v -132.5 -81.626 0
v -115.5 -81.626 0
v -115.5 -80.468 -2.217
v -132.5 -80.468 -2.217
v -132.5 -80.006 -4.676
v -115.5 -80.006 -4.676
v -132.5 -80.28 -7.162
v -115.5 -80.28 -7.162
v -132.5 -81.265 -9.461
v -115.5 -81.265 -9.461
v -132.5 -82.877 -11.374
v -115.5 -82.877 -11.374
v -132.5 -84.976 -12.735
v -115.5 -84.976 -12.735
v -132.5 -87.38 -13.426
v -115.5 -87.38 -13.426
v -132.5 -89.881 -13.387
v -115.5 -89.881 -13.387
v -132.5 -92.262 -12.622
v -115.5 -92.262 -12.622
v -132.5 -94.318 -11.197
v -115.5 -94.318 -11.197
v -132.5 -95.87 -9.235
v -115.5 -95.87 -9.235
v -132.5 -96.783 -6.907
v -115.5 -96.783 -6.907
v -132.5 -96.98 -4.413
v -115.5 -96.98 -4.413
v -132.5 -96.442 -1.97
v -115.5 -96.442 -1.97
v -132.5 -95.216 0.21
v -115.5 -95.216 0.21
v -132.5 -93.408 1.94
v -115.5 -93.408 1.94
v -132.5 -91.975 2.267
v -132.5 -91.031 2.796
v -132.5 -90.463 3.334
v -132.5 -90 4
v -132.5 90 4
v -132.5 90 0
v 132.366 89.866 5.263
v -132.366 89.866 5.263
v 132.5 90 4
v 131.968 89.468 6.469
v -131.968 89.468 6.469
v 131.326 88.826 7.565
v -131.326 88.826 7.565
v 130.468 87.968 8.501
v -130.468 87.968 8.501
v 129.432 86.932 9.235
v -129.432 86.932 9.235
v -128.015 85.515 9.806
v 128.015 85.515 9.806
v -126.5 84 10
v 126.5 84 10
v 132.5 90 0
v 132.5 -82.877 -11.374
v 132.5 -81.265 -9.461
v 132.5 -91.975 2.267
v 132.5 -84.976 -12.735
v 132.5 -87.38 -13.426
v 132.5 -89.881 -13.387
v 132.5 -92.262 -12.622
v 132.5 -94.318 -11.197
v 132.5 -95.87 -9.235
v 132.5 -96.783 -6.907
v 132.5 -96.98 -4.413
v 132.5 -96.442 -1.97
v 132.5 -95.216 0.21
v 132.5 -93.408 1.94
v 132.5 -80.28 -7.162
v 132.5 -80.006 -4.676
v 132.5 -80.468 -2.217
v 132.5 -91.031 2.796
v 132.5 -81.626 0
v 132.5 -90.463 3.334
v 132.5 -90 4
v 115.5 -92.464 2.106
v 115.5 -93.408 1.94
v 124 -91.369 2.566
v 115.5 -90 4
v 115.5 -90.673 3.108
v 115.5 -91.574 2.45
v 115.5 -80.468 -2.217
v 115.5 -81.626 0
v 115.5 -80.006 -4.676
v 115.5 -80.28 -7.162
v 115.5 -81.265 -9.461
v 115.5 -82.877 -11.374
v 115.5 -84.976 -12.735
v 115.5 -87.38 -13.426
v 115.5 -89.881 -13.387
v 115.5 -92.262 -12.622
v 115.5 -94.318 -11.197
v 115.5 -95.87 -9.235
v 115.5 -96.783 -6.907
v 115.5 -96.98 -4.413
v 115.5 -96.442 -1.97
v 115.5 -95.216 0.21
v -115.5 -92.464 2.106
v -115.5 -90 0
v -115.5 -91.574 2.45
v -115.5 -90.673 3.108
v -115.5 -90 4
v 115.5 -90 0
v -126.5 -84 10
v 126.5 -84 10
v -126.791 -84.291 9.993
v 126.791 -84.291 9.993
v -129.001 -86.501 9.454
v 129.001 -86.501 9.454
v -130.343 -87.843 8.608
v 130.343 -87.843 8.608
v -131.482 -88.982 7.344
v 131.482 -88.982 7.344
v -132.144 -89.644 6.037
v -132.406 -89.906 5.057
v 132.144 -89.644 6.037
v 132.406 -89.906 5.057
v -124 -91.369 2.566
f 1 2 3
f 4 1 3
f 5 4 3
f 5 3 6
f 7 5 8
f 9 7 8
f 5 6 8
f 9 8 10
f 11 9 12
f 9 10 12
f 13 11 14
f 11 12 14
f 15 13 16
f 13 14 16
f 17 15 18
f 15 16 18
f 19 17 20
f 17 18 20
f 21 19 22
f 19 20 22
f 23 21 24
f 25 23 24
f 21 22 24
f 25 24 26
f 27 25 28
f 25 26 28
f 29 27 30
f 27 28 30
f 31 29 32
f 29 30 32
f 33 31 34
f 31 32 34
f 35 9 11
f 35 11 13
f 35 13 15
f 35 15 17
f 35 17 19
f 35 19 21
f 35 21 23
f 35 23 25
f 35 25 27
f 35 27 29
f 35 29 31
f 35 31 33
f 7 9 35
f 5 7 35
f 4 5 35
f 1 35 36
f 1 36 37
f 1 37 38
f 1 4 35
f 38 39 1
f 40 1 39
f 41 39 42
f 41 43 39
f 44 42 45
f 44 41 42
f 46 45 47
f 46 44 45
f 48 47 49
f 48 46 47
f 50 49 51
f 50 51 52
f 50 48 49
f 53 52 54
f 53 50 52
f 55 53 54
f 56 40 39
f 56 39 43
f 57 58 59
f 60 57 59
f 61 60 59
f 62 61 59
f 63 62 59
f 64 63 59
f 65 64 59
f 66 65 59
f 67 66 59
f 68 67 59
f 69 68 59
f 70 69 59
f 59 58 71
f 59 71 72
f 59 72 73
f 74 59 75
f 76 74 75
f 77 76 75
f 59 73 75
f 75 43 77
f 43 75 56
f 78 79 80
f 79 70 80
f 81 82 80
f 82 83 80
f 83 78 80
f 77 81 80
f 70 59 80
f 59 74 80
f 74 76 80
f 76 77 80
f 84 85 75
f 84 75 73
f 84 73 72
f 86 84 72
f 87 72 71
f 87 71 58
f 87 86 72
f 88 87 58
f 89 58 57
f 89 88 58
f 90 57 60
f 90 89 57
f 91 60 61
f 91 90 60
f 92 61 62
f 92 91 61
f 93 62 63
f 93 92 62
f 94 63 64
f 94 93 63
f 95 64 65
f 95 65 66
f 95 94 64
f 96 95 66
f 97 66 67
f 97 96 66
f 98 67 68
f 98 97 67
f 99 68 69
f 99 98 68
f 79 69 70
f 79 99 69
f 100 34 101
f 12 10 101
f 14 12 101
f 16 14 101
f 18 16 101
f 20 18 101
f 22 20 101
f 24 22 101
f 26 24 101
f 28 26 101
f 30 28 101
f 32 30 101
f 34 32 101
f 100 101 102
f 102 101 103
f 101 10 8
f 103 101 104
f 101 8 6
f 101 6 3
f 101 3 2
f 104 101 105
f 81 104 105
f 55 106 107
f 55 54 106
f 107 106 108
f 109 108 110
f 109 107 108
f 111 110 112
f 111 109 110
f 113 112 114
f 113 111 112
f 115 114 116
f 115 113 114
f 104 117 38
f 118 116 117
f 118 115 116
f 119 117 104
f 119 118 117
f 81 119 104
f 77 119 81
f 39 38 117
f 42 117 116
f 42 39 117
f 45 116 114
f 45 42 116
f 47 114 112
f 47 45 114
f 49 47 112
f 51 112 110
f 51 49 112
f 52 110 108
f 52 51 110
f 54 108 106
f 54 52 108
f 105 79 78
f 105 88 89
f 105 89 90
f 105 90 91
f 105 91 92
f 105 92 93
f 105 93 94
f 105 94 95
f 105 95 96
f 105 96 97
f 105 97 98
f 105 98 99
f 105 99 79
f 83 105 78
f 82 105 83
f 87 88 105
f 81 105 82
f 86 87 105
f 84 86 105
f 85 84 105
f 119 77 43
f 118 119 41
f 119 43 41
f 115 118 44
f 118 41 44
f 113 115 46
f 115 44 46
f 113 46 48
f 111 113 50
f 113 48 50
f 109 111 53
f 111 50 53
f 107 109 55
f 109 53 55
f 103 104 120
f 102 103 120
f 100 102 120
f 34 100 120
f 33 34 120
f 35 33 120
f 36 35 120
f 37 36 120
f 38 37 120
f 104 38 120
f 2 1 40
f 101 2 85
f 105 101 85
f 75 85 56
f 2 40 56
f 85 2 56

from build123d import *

# Parameters (mm, degrees)
SKETCH1_W           = 265
SKETCH1_H           = 180
BOSS_EXTRUDE1_DEPTH = 10
BOSS_EXTRUDE2_START = -17
BOSS_EXTRUDE2_DEPTH = 17
FILLET1_R           = 6
FILLET2_R           = 6
CUT_EXTRUDE2_START  = -265
CUT_EXTRUDE2_DEPTH  = 265


# Read off the part's stored shape, not the designer's step: Boss-Extrude2, Cut-Extrude2
with BuildPart() as part:
    # Sketch1 → Boss-Extrude1 (new body)
    with BuildSketch(Plane.XY):
        Rectangle(SKETCH1_W, SKETCH1_H)
    extrude(amount=BOSS_EXTRUDE1_DEPTH)

    # Boss-Extrude2 outline → Boss-Extrude2 (add)
    with BuildSketch(Plane.ZY.offset(132.5).offset(BOSS_EXTRUDE2_START)):
        with BuildLine():
            ThreePointArc((0, -81.626136458), (-13.387109794, -89.880720577), (1.939630355, -93.408312392))
            add(Edge.make_bspline(
                [(1.939630355, -93.408312392), (5.863215247, -91.451215581), (10, -90)],
                knots=[0, 0, 0, 1, 1, 1], degree=2))
            Line((10, -90), (0, -90))
            Line((0, -90), (0, -81.626136458))
        make_face()
    boss_extrude2 = extrude(amount=BOSS_EXTRUDE2_DEPTH)

    # Mirror1: Boss-Extrude2 across plane
    add(boss_extrude2.mirror(Plane(origin=(0, 0, 0), x_dir=(0, 0, 1), z_dir=(1, 0, 0))))

    # Fillet1
    fillet1_edges = [part.edges().sort_by_distance(p)[0] for p in [
        (132.5, 0, 10),
        (0, 90, 10),
        (-132.5, 0, 10),
    ]]
    fillet(fillet1_edges, radius=FILLET1_R)

    # Fillet2
    fillet2_edges = [part.edges().sort_by_distance(p)[0] for p in [
        (0, -90, 10),
    ]]
    fillet(fillet2_edges, radius=FILLET2_R)

    # Cut-Extrude2 outline → Cut-Extrude2 (cut)
    with BuildSketch(Plane.ZY.offset(132.5).offset(CUT_EXTRUDE2_START)):
        with BuildLine():
            add(Edge.make_bspline(
                [(1.939630355, -93.408312392), (2.161603751, -91.034387849), (4, -90)],
                knots=[0, 0, 0, 1, 1, 1], degree=2))
            add(Edge.make_bspline(
                [(1.939630355, -93.408312392), (5.863215247, -91.451215581), (10, -90)],
                knots=[0, 0, 0, 1, 1, 1], degree=2))
            Line((10, -90), (10, -84))
            ThreePointArc((10, -84), (8.242640687, -88.242640687), (4, -90))
        make_face()
    extrude(amount=CUT_EXTRUDE2_DEPTH, mode=Mode.SUBTRACT)


solid = part.part
